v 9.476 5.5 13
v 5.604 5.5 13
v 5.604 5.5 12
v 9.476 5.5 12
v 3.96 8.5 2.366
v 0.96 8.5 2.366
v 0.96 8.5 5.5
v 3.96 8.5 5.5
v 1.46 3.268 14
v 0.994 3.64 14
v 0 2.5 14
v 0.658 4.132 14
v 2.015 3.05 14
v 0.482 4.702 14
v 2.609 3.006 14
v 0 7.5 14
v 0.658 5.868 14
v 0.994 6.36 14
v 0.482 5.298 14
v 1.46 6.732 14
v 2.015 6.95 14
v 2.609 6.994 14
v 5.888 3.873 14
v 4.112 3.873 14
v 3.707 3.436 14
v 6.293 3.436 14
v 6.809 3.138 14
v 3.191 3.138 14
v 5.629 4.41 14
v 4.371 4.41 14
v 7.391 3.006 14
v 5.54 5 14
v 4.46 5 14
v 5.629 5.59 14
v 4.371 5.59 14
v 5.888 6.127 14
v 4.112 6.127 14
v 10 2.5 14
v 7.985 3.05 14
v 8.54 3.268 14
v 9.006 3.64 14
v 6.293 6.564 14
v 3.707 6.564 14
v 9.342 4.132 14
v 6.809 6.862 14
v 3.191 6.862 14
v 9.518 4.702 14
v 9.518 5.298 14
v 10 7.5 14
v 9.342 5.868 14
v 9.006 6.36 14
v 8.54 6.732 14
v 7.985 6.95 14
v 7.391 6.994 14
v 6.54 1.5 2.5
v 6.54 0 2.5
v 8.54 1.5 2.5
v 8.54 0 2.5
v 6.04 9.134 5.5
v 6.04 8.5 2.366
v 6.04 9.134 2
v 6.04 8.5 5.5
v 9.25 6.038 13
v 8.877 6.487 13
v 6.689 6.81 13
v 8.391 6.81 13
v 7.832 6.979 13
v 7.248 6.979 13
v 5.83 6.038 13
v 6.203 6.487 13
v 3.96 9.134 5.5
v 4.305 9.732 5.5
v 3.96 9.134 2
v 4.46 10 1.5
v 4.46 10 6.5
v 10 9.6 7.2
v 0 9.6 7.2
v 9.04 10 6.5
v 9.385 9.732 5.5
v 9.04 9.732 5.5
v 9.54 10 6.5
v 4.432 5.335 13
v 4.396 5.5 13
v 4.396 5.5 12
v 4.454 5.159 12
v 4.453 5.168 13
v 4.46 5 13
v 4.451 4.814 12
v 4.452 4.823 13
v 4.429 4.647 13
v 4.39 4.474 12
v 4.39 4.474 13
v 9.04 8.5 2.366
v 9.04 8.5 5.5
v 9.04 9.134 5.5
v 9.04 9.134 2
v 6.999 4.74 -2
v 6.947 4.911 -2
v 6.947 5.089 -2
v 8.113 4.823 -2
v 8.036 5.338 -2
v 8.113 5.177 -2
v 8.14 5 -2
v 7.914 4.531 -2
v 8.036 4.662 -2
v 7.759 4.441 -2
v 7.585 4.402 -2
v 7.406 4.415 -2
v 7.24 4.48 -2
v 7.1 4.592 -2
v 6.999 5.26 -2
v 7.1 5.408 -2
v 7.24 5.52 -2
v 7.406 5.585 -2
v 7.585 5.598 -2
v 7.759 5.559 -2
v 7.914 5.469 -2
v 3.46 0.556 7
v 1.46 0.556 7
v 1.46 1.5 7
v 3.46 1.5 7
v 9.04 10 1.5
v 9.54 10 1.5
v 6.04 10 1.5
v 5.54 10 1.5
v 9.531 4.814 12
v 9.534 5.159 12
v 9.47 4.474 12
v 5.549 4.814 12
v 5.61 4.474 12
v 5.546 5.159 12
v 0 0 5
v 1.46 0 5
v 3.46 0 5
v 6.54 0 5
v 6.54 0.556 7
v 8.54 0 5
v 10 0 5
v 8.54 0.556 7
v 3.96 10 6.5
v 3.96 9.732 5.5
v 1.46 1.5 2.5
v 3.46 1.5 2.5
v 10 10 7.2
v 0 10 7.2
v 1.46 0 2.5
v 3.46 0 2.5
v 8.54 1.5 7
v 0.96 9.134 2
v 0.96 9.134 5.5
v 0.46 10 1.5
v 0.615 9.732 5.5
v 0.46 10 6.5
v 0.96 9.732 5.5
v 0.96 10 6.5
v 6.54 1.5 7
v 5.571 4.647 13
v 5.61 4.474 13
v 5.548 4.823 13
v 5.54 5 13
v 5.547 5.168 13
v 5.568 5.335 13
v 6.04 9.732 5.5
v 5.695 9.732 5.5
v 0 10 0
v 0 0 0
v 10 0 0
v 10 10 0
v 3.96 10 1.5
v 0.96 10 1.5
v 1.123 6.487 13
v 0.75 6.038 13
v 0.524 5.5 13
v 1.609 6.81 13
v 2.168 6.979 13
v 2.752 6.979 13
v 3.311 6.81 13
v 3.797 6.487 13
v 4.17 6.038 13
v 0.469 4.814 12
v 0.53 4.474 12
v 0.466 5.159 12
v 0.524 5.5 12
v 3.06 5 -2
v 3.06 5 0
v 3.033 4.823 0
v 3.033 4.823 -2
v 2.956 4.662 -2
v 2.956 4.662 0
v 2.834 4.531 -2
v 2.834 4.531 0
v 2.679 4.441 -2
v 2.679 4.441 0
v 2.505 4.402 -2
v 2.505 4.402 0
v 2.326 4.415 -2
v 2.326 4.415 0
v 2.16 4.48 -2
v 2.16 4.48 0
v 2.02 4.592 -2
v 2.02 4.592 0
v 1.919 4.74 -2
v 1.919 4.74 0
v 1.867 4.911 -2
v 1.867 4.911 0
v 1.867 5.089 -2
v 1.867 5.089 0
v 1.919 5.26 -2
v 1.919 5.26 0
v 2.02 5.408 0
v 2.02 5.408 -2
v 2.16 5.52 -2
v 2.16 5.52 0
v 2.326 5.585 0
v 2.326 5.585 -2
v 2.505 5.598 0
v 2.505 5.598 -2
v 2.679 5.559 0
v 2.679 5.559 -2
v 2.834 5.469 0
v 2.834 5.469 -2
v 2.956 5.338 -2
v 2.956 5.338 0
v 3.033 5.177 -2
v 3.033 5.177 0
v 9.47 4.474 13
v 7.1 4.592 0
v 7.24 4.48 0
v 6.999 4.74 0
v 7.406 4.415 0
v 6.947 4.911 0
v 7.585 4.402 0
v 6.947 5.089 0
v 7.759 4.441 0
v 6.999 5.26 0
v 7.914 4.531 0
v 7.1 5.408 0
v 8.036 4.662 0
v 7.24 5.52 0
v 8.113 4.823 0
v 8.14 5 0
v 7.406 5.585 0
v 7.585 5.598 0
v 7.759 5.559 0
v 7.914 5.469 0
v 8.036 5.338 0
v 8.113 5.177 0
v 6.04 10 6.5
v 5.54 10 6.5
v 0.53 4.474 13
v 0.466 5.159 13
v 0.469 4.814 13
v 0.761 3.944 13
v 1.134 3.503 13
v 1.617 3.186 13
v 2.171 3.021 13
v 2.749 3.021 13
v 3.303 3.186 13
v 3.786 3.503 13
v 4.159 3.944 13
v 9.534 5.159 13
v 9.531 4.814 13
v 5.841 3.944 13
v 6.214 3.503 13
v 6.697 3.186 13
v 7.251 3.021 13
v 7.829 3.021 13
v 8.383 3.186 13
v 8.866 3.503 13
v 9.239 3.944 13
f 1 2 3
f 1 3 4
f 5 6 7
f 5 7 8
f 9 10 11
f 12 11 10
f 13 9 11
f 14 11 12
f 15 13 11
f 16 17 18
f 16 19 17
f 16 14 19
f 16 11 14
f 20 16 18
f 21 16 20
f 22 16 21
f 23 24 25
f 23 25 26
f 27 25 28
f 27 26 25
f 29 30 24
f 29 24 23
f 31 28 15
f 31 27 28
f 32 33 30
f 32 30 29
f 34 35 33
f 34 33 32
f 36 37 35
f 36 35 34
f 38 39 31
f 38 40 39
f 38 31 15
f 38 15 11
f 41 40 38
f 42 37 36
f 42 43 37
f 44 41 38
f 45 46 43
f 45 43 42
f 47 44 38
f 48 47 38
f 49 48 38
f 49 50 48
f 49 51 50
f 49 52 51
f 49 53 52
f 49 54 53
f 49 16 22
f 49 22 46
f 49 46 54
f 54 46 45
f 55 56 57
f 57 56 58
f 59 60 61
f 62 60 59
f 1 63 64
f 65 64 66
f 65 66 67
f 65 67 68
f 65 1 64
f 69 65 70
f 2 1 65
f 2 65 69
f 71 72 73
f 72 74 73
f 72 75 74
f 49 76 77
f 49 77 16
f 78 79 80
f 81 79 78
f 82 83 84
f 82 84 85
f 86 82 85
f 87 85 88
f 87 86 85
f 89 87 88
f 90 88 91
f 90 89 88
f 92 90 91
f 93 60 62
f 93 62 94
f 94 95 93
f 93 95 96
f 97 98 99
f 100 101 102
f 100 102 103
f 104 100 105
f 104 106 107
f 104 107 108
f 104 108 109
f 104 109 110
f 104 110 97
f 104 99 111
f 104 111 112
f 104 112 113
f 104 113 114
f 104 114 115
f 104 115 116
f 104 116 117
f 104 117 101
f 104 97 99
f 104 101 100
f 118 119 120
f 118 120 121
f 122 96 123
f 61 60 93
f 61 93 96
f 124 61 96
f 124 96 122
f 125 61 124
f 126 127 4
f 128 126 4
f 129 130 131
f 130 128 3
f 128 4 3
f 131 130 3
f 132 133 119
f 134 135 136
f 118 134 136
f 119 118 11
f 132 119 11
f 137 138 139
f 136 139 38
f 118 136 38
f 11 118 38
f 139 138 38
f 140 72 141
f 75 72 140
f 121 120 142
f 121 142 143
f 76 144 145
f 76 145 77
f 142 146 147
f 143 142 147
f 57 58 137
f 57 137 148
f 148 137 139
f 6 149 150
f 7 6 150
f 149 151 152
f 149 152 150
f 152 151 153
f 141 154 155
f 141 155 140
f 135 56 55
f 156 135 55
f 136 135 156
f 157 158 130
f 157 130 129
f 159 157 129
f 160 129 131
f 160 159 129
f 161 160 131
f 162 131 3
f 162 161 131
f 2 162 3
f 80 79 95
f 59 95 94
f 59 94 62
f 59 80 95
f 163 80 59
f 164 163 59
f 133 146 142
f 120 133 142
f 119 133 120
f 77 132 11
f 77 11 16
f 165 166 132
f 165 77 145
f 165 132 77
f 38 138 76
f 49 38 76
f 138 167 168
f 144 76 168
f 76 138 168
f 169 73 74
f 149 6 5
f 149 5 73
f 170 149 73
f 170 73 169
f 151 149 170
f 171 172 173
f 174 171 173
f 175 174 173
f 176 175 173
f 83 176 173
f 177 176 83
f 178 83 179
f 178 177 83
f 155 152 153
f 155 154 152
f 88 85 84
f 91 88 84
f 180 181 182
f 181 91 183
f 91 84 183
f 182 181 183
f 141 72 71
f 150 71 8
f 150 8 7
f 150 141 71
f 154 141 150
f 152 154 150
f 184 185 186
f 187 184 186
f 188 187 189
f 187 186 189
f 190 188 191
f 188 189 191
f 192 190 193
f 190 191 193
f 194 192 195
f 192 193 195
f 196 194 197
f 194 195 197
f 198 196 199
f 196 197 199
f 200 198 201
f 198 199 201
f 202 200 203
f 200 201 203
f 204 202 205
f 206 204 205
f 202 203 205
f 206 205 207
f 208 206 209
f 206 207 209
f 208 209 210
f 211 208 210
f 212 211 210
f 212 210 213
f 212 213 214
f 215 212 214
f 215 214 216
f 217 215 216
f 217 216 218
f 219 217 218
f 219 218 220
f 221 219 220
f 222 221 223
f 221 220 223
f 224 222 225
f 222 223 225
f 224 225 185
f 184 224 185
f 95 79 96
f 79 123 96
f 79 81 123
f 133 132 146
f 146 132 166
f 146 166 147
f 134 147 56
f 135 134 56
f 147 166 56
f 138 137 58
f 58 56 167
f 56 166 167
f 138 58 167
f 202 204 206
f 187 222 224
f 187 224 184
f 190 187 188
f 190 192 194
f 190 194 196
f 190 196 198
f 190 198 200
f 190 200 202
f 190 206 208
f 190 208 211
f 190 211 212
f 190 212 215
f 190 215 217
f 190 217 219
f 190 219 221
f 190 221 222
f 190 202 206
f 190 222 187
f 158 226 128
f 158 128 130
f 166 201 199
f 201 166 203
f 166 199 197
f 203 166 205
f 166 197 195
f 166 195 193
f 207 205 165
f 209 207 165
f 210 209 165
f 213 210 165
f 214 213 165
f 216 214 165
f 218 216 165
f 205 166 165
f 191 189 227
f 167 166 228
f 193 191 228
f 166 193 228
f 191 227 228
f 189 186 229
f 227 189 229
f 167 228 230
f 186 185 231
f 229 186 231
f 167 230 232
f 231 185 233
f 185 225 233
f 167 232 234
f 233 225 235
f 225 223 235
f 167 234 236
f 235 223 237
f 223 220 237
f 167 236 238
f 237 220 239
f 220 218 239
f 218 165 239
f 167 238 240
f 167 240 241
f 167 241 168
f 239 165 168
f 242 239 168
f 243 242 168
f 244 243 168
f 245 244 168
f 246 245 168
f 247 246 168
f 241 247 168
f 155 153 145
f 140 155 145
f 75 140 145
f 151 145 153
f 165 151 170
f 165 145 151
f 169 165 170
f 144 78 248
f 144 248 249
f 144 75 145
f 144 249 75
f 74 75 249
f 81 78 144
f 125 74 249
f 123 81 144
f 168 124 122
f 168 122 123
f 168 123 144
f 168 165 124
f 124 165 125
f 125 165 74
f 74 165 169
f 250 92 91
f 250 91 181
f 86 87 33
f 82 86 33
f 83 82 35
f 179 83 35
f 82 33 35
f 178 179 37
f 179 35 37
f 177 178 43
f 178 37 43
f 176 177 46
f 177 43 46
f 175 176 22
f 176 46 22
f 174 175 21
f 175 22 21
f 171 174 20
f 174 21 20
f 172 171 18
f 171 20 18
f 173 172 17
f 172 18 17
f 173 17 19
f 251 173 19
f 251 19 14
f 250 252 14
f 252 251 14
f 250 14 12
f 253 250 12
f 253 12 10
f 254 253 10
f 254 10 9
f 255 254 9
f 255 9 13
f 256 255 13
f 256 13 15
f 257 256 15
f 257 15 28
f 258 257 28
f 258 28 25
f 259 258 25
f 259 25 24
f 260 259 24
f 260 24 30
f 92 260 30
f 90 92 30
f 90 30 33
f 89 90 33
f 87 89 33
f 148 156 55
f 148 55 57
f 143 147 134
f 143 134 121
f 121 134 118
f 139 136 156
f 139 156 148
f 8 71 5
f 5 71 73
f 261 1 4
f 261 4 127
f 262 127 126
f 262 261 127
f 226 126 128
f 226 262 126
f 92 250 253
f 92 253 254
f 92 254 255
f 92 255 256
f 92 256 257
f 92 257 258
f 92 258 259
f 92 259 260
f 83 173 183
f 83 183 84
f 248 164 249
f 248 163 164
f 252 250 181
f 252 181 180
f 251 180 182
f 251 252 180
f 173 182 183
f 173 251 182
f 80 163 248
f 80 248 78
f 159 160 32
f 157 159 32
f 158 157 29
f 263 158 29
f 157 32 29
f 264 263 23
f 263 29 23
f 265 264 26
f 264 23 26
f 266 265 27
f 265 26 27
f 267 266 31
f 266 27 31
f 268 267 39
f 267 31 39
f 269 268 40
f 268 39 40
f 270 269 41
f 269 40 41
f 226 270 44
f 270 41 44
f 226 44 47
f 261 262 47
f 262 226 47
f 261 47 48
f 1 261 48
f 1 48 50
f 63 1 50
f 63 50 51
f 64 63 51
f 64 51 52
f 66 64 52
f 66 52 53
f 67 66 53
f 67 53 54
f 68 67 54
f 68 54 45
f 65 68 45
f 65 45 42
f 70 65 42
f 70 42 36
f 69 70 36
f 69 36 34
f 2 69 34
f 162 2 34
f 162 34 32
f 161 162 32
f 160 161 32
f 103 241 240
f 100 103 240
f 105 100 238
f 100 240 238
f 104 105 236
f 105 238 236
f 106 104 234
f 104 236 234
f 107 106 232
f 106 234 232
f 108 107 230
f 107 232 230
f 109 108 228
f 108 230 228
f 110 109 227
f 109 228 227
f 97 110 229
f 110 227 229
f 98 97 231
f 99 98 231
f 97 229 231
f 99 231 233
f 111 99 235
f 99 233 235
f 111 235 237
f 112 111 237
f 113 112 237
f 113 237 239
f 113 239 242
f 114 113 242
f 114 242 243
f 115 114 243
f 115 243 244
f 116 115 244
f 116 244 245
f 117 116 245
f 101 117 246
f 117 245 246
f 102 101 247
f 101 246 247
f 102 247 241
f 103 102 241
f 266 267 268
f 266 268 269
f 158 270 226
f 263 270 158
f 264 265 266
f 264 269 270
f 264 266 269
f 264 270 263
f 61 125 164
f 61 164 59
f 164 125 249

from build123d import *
from build123d.topology import SkipClean

# Parameters (mm, degrees)
SKETCH_1_W          = 10
SKETCH_1_H          = 10
EXTRUDE_1_DEPTH     = 14
CUT_EXTRUDE_1_DEPTH = 20.899748742
SKETCH_3_W          = 3
SKETCH_3_H          = 3
CUT_EXTRUDE_2_DEPTH = 1.5
CHAMFER_1_SIZE      = 1
CHAMFER_1_SIZE2     = 0.267949192
CHAMFER_2_SIZE      = 1
CHAMFER_2_SIZE_2    = 1.732050808
CHAMFER_3_SIZE      = 0.5
CHAMFER_3_SIZE_2    = 0.866025404
SKETCH_4_W          = 2
SKETCH_4_H          = 4.5
CUT_EXTRUDE_3_DEPTH = 1.5
SKETCH_5_R          = 2
CUT_EXTRUDE_4_DEPTH = 1
CUT_EXTRUDE_5_DEPTH = 1
SKETCH_7_R          = 0.6
EXTRUDE_2_DEPTH     = 2


with BuildPart() as part:
    # 草图1 → 凸台-拉伸1 (new body)
    with BuildSketch(Plane.XY):
        with Locations((5, 5)):
            Rectangle(SKETCH_1_W, SKETCH_1_H)
    extrude(amount=EXTRUDE_1_DEPTH)

    # 草图2 → 切除-拉伸1 (cut, through all)
    with BuildSketch(Plane(origin=(10, 0, 0), x_dir=(0, 0, -1), z_dir=(1, 0, 0))):
        Polygon((-14, 2.5), (-14, 0), (-5, 0), align=None)
        Polygon((-14, 7.5), (-14, 10), (-7.2, 10), (-7.2, 9.6), align=None)
    extrude(amount=-CUT_EXTRUDE_1_DEPTH, mode=Mode.SUBTRACT)

    # 草图3 → 切除-拉伸2 (cut)
    with BuildSketch(Plane(origin=(0, 10, 0), x_dir=(1, 0, 0), z_dir=(0, 1, 0))):
        with Locations((2.46, -4)):
            Rectangle(SKETCH_3_W, SKETCH_3_H)
        with Locations((7.54, -4)):
            Rectangle(SKETCH_3_W, SKETCH_3_H)
    extrude(amount=-CUT_EXTRUDE_2_DEPTH, mode=Mode.SUBTRACT)

    # 倒角1
    chamfer_1_edges = [part.edges().sort_by_distance(p)[0] for p in [
        (2.46, 10, 5.5),
        (7.54, 10, 5.5),
    ]]
    chamfer_1_side = [part.faces().sort_by_distance(p)[0] for p in [
        (5, 10, 3.466666667),
    ]]
    chamfer(chamfer_1_edges, length=CHAMFER_1_SIZE, length2=CHAMFER_1_SIZE2, reference=chamfer_1_side[0])

    # 倒角2
    # the kernel refuses this chamfer: 1.732050808, 1 mm, written as the material it takes off along each edge
    with BuildSketch(Plane(origin=(0.96, 10, 2.5), x_dir=(0, 0.057893862402671484, -0.9983227437537926), z_dir=(1, 0, 0))) as chamfer_2_piece_1_section:
        Polygon((CHAMFER_2_SIZE * 0.998322743754, -CHAMFER_2_SIZE * 0.0578938624027), (-CHAMFER_2_SIZE_2 * 0.0578938623883, -CHAMFER_2_SIZE_2 * 0.998322743505), (0, 0), align=None)
    chamfer_2_piece_1 = extrude(amount=3, mode=Mode.PRIVATE)
    chamfer_2_piece_1 = split(chamfer_2_piece_1, bisect_by=Plane(origin=(2.46, 8.5, 2.161390478), z_dir=(0, 1, 0)), keep=Keep.TOP, mode=Mode.PRIVATE)
    add(chamfer_2_piece_1, mode=Mode.SUBTRACT)
    with BuildSketch(Plane(origin=(-3.520963971, 10, 2.5), x_dir=(0, 0.057893862402671484, -0.9983227437537926), z_dir=(1, 0, 0))) as chamfer_2_piece_2_section:
        Polygon((CHAMFER_2_SIZE * 0.998322743754, -CHAMFER_2_SIZE * 0.0578938624027), (-CHAMFER_2_SIZE_2 * 0.0578938623883, -CHAMFER_2_SIZE_2 * 0.998322743505), (0, 0), align=None)
    chamfer_2_piece_2 = extrude(amount=11.961927941, mode=Mode.PRIVATE)
    chamfer_2_piece_2 = split(chamfer_2_piece_2, bisect_by=Plane(origin=(7.240481985, 8.5, 2.161390478), z_dir=(0, 1, 0)), keep=Keep.TOP, mode=Mode.PRIVATE)
    chamfer_2_piece_2 = split(chamfer_2_piece_2, bisect_by=Plane(origin=(6.04, 9.440926985, 2.161390478), z_dir=(1, 0, 0)), keep=Keep.TOP, mode=Mode.PRIVATE)
    add(chamfer_2_piece_2, mode=Mode.SUBTRACT)
    with BuildSketch(Plane(origin=(1.559036029, 10, 2.5), x_dir=(0, 0.05789386240267147, -0.9983227437537926), z_dir=(1, 0, 0))) as chamfer_2_piece_3_section:
        Polygon((CHAMFER_2_SIZE * 0.998322743754, -CHAMFER_2_SIZE * 0.0578938624027), (-CHAMFER_2_SIZE_2 * 0.0578938623883, -CHAMFER_2_SIZE_2 * 0.998322743505), (0, 0), align=None)
    chamfer_2_piece_3 = extrude(amount=11.961927941, mode=Mode.PRIVATE)
    chamfer_2_piece_3 = split(chamfer_2_piece_3, bisect_by=Plane(origin=(2.759518015, 8.5, 2.161390478), z_dir=(0, 1, 0)), keep=Keep.TOP, mode=Mode.PRIVATE)
    chamfer_2_piece_3 = split(chamfer_2_piece_3, bisect_by=Plane(origin=(3.96, 9.440926985, 2.161390478), z_dir=(-1, 0, 0)), keep=Keep.TOP, mode=Mode.PRIVATE)
    add(chamfer_2_piece_3, mode=Mode.SUBTRACT)
    with BuildSketch(Plane(origin=(6.04, 10, 2.5), x_dir=(0, 0.057893862402671484, -0.9983227437537926), z_dir=(1, 0, 0))) as chamfer_2_piece_4_section:
        Polygon((CHAMFER_2_SIZE * 0.998322743754, -CHAMFER_2_SIZE * 0.0578938624027), (-CHAMFER_2_SIZE_2 * 0.0578938623883, -CHAMFER_2_SIZE_2 * 0.998322743505), (0, 0), align=None)
    chamfer_2_piece_4 = extrude(amount=3, mode=Mode.PRIVATE)
    chamfer_2_piece_4 = split(chamfer_2_piece_4, bisect_by=Plane(origin=(7.54, 8.5, 2.161390478), z_dir=(0, 1, 0)), keep=Keep.TOP, mode=Mode.PRIVATE)
    add(chamfer_2_piece_4, mode=Mode.SUBTRACT)

    # 倒角3
    # the kernel refuses this chamfer: 0.866025404, 0.5 mm, written as the material it takes off along each edge
    with BuildSketch(Plane(origin=(0.96, 10, 8.740481985), x_dir=(-0.9983227437537926, 0.057893862402669756, 3.38732848352391e-15), z_dir=(0, 0, -1))) as chamfer_3_piece_1_section:
        Polygon((CHAMFER_3_SIZE * 0.998322743754, -CHAMFER_3_SIZE * 0.0578938624027), (-CHAMFER_3_SIZE_2 * 0.0578938623883, -CHAMFER_3_SIZE_2 * 0.998322743505), (0, 0), align=None)
    chamfer_3_piece_1 = extrude(amount=9.480963971, mode=Mode.PRIVATE)
    chamfer_3_piece_1 = split(chamfer_3_piece_1, bisect_by=Plane(origin=(0.892667554, 9.405329997, 5.5), z_dir=(0, 0, -1)), keep=Keep.TOP, mode=Mode.PRIVATE)
    chamfer_3_piece_1 = split(chamfer_3_piece_1, bisect_by=Plane(origin=(0.892667554, 9.55774733, 4.849490567), z_dir=(0, -0.9659258262890682, 0.25881904510252124)), keep=Keep.TOP, mode=Mode.PRIVATE)
    add(chamfer_3_piece_1, mode=Mode.SUBTRACT)
    with BuildSketch(Plane(origin=(0.96, 10, 8.740481985), x_dir=(-0.9983227437537926, 0.057893862402669756, 3.38732848352391e-15), z_dir=(0, 0, -1))) as chamfer_3_piece_2_section:
        Polygon((CHAMFER_3_SIZE * 0.998322743754, -CHAMFER_3_SIZE * 0.0578938624027), (-CHAMFER_3_SIZE_2 * 0.0578938623883, -CHAMFER_3_SIZE_2 * 0.998322743505), (0, 0), align=None)
    chamfer_3_piece_2 = extrude(amount=9.480963971, mode=Mode.PRIVATE)
    chamfer_3_piece_2 = split(chamfer_3_piece_2, bisect_by=Plane(origin=(0.727363304, 9.931547557, 5.5), z_dir=(0, 0, 1)), keep=Keep.TOP, mode=Mode.PRIVATE)
    chamfer_3_piece_2 = split(chamfer_3_piece_2, bisect_by=Plane(origin=(0.727363304, 9.838481056, 5.897203096), z_dir=(0, 0.9659258262890682, -0.25881904510252124)), keep=Keep.TOP, mode=Mode.PRIVATE)
    add(chamfer_3_piece_2, mode=Mode.SUBTRACT)
    with BuildSketch(Plane(origin=(0.96, 10, 8.740481985), x_dir=(-0.9983227437537926, 0.057893862402669756, 3.38732848352391e-15), z_dir=(0, 0, -1))) as chamfer_3_piece_3_section:
        Polygon((CHAMFER_3_SIZE * 0.998322743754, -CHAMFER_3_SIZE * 0.0578938624027), (-CHAMFER_3_SIZE_2 * 0.0578938623883, -CHAMFER_3_SIZE_2 * 0.998322743505), (0, 0), align=None)
    chamfer_3_piece_3 = extrude(amount=9.480963971, mode=Mode.PRIVATE)
    chamfer_3_piece_3 = split(chamfer_3_piece_3, bisect_by=Plane(origin=(0.786656387, 9.751906355, 5.5), z_dir=(0, 0, -1)), keep=Keep.TOP, mode=Mode.PRIVATE)
    chamfer_3_piece_3 = split(chamfer_3_piece_3, bisect_by=Plane(origin=(0.786656387, 8.975998219, 2.091207704), z_dir=(0, 0.4999999999999566, 0.8660254037844637)), keep=Keep.TOP, mode=Mode.PRIVATE)
    chamfer_3_piece_3 = split(chamfer_3_piece_3, bisect_by=Plane(origin=(0.786656387, 9.217160881, 3.578404635), z_dir=(0, 0.9659258262890682, -0.25881904510252124)), keep=Keep.TOP, mode=Mode.PRIVATE)
    add(chamfer_3_piece_3, mode=Mode.SUBTRACT)
    with BuildSketch(Plane(origin=(3.96, 10, -0.740481985), x_dir=(0.9983227437537926, 0.057893862402669756, 3.38732848352391e-15), z_dir=(0, 0, 1))) as chamfer_3_piece_4_section:
        Polygon((CHAMFER_3_SIZE * 0.998322743754, -CHAMFER_3_SIZE * 0.0578938624027), (-CHAMFER_3_SIZE_2 * 0.0578938623883, -CHAMFER_3_SIZE_2 * 0.998322743505), (0, 0), align=None)
    chamfer_3_piece_4 = extrude(amount=9.480963971, mode=Mode.PRIVATE)
    chamfer_3_piece_4 = split(chamfer_3_piece_4, bisect_by=Plane(origin=(4.133343613, 9.751906355, 5.5), z_dir=(0, 0, -1)), keep=Keep.TOP, mode=Mode.PRIVATE)
    chamfer_3_piece_4 = split(chamfer_3_piece_4, bisect_by=Plane(origin=(4.133343613, 8.975998219, 2.091207704), z_dir=(0, 0.4999999999999566, 0.8660254037844637)), keep=Keep.TOP, mode=Mode.PRIVATE)
    chamfer_3_piece_4 = split(chamfer_3_piece_4, bisect_by=Plane(origin=(4.133343613, 9.217160881, 3.578404635), z_dir=(0, 0.9659258262890682, -0.25881904510252124)), keep=Keep.TOP, mode=Mode.PRIVATE)
    add(chamfer_3_piece_4, mode=Mode.SUBTRACT)
    with BuildSketch(Plane(origin=(3.96, 10, -0.740481985), x_dir=(0.9983227437537926, 0.057893862402669756, 3.38732848352391e-15), z_dir=(0, 0, 1))) as chamfer_3_piece_5_section:
        Polygon((CHAMFER_3_SIZE * 0.998322743754, -CHAMFER_3_SIZE * 0.0578938624027), (-CHAMFER_3_SIZE_2 * 0.0578938623883, -CHAMFER_3_SIZE_2 * 0.998322743505), (0, 0), align=None)
    chamfer_3_piece_5 = extrude(amount=9.480963971, mode=Mode.PRIVATE)
    chamfer_3_piece_5 = split(chamfer_3_piece_5, bisect_by=Plane(origin=(4.027332446, 9.405329997, 5.5), z_dir=(0, 0, -1)), keep=Keep.TOP, mode=Mode.PRIVATE)
    chamfer_3_piece_5 = split(chamfer_3_piece_5, bisect_by=Plane(origin=(4.027332446, 9.55774733, 4.849490567), z_dir=(0, -0.9659258262890682, 0.25881904510252124)), keep=Keep.TOP, mode=Mode.PRIVATE)
    add(chamfer_3_piece_5, mode=Mode.SUBTRACT)
    with BuildSketch(Plane(origin=(3.96, 10, -0.740481985), x_dir=(0.9983227437537926, 0.057893862402669756, 3.38732848352391e-15), z_dir=(0, 0, 1))) as chamfer_3_piece_6_section:
        Polygon((CHAMFER_3_SIZE * 0.998322743754, -CHAMFER_3_SIZE * 0.0578938624027), (-CHAMFER_3_SIZE_2 * 0.0578938623883, -CHAMFER_3_SIZE_2 * 0.998322743505), (0, 0), align=None)
    chamfer_3_piece_6 = extrude(amount=9.480963971, mode=Mode.PRIVATE)
    chamfer_3_piece_6 = split(chamfer_3_piece_6, bisect_by=Plane(origin=(4.192636696, 9.931547557, 5.5), z_dir=(0, 0, 1)), keep=Keep.TOP, mode=Mode.PRIVATE)
    chamfer_3_piece_6 = split(chamfer_3_piece_6, bisect_by=Plane(origin=(4.192636696, 9.838481056, 5.897203096), z_dir=(0, 0.9659258262890682, -0.25881904510252124)), keep=Keep.TOP, mode=Mode.PRIVATE)
    add(chamfer_3_piece_6, mode=Mode.SUBTRACT)
    with BuildSketch(Plane(origin=(6.04, 10, 8.740481985), x_dir=(-0.9983227437537926, 0.057893862402669756, 3.455429323526044e-15), z_dir=(0, 0, -1))) as chamfer_3_piece_7_section:
        Polygon((CHAMFER_3_SIZE * 0.998322743754, -CHAMFER_3_SIZE * 0.0578938624027), (-CHAMFER_3_SIZE_2 * 0.0578938623883, -CHAMFER_3_SIZE_2 * 0.998322743505), (0, 0), align=None)
    chamfer_3_piece_7 = extrude(amount=9.480963971, mode=Mode.PRIVATE)
    chamfer_3_piece_7 = split(chamfer_3_piece_7, bisect_by=Plane(origin=(5.972667554, 9.55774733, 4.849490567), z_dir=(0, -0.9659258262890682, 0.25881904510252124)), keep=Keep.TOP, mode=Mode.PRIVATE)
    chamfer_3_piece_7 = split(chamfer_3_piece_7, bisect_by=Plane(origin=(5.972667554, 9.405329997, 5.5), z_dir=(0, 0, -1)), keep=Keep.TOP, mode=Mode.PRIVATE)
    add(chamfer_3_piece_7, mode=Mode.SUBTRACT)
    with BuildSketch(Plane(origin=(6.04, 10, 8.740481985), x_dir=(-0.9983227437537926, 0.057893862402669756, 3.455429323526044e-15), z_dir=(0, 0, -1))) as chamfer_3_piece_8_section:
        Polygon((CHAMFER_3_SIZE * 0.998322743754, -CHAMFER_3_SIZE * 0.0578938624027), (-CHAMFER_3_SIZE_2 * 0.0578938623883, -CHAMFER_3_SIZE_2 * 0.998322743505), (0, 0), align=None)
    chamfer_3_piece_8 = extrude(amount=9.480963971, mode=Mode.PRIVATE)
    chamfer_3_piece_8 = split(chamfer_3_piece_8, bisect_by=Plane(origin=(5.807363304, 9.838481056, 5.897203096), z_dir=(0, 0.9659258262890682, -0.25881904510252124)), keep=Keep.TOP, mode=Mode.PRIVATE)
    chamfer_3_piece_8 = split(chamfer_3_piece_8, bisect_by=Plane(origin=(5.807363304, 9.931547557, 5.5), z_dir=(0, 0, 1)), keep=Keep.TOP, mode=Mode.PRIVATE)
    add(chamfer_3_piece_8, mode=Mode.SUBTRACT)
    with BuildSketch(Plane(origin=(6.04, 10, 8.740481985), x_dir=(-0.9983227437537926, 0.057893862402669756, 3.455429323526044e-15), z_dir=(0, 0, -1))) as chamfer_3_piece_9_section:
        Polygon((CHAMFER_3_SIZE * 0.998322743754, -CHAMFER_3_SIZE * 0.0578938624027), (-CHAMFER_3_SIZE_2 * 0.0578938623883, -CHAMFER_3_SIZE_2 * 0.998322743505), (0, 0), align=None)
    chamfer_3_piece_9 = extrude(amount=9.480963971, mode=Mode.PRIVATE)
    chamfer_3_piece_9 = split(chamfer_3_piece_9, bisect_by=Plane(origin=(5.866656387, 9.217160881, 3.578404635), z_dir=(0, 0.9659258262890682, -0.25881904510252124)), keep=Keep.TOP, mode=Mode.PRIVATE)
    chamfer_3_piece_9 = split(chamfer_3_piece_9, bisect_by=Plane(origin=(5.866656387, 9.751906355, 5.5), z_dir=(0, 0, -1)), keep=Keep.TOP, mode=Mode.PRIVATE)
    chamfer_3_piece_9 = split(chamfer_3_piece_9, bisect_by=Plane(origin=(5.866656387, 8.975998219, 2.091207704), z_dir=(0, 0.4999999999999566, 0.8660254037844637)), keep=Keep.TOP, mode=Mode.PRIVATE)
    add(chamfer_3_piece_9, mode=Mode.SUBTRACT)
    with BuildSketch(Plane(origin=(9.04, 10, -0.740481985), x_dir=(0.9983227437537927, 0.05789386240266987, 3.455429323526051e-15), z_dir=(0, 0, 1))) as chamfer_3_piece_10_section:
        Polygon((CHAMFER_3_SIZE * 0.998322743754, -CHAMFER_3_SIZE * 0.0578938624027), (-CHAMFER_3_SIZE_2 * 0.0578938623883, -CHAMFER_3_SIZE_2 * 0.998322743505), (0, 0), align=None)
    chamfer_3_piece_10 = extrude(amount=9.480963971, mode=Mode.PRIVATE)
    chamfer_3_piece_10 = split(chamfer_3_piece_10, bisect_by=Plane(origin=(9.213343613, 9.751906355, 5.5), z_dir=(0, 0, -1)), keep=Keep.TOP, mode=Mode.PRIVATE)
    chamfer_3_piece_10 = split(chamfer_3_piece_10, bisect_by=Plane(origin=(9.213343613, 8.975998219, 2.091207704), z_dir=(0, 0.4999999999999566, 0.8660254037844637)), keep=Keep.TOP, mode=Mode.PRIVATE)
    chamfer_3_piece_10 = split(chamfer_3_piece_10, bisect_by=Plane(origin=(9.213343613, 9.217160881, 3.578404635), z_dir=(0, 0.9659258262890682, -0.25881904510252124)), keep=Keep.TOP, mode=Mode.PRIVATE)
    add(chamfer_3_piece_10, mode=Mode.SUBTRACT)
    with BuildSketch(Plane(origin=(9.04, 10, -0.740481985), x_dir=(0.9983227437537927, 0.05789386240266987, 3.455429323526051e-15), z_dir=(0, 0, 1))) as chamfer_3_piece_11_section:
        Polygon((CHAMFER_3_SIZE * 0.998322743754, -CHAMFER_3_SIZE * 0.0578938624027), (-CHAMFER_3_SIZE_2 * 0.0578938623883, -CHAMFER_3_SIZE_2 * 0.998322743505), (0, 0), align=None)
    chamfer_3_piece_11 = extrude(amount=9.480963971, mode=Mode.PRIVATE)
    chamfer_3_piece_11 = split(chamfer_3_piece_11, bisect_by=Plane(origin=(9.107332446, 9.405329997, 5.5), z_dir=(0, 0, -1)), keep=Keep.TOP, mode=Mode.PRIVATE)
    chamfer_3_piece_11 = split(chamfer_3_piece_11, bisect_by=Plane(origin=(9.107332446, 9.55774733, 4.849490567), z_dir=(0, -0.9659258262890682, 0.25881904510252124)), keep=Keep.TOP, mode=Mode.PRIVATE)
    add(chamfer_3_piece_11, mode=Mode.SUBTRACT)
    with BuildSketch(Plane(origin=(9.04, 10, -0.740481985), x_dir=(0.9983227437537927, 0.05789386240266987, 3.455429323526051e-15), z_dir=(0, 0, 1))) as chamfer_3_piece_12_section:
        Polygon((CHAMFER_3_SIZE * 0.998322743754, -CHAMFER_3_SIZE * 0.0578938624027), (-CHAMFER_3_SIZE_2 * 0.0578938623883, -CHAMFER_3_SIZE_2 * 0.998322743505), (0, 0), align=None)
    chamfer_3_piece_12 = extrude(amount=9.480963971, mode=Mode.PRIVATE)
    chamfer_3_piece_12 = split(chamfer_3_piece_12, bisect_by=Plane(origin=(9.272636696, 9.931547557, 5.5), z_dir=(0, 0, 1)), keep=Keep.TOP, mode=Mode.PRIVATE)
    chamfer_3_piece_12 = split(chamfer_3_piece_12, bisect_by=Plane(origin=(9.272636696, 9.838481056, 5.897203096), z_dir=(0, 0.9659258262890682, -0.25881904510252124)), keep=Keep.TOP, mode=Mode.PRIVATE)
    add(chamfer_3_piece_12, mode=Mode.SUBTRACT)

    # 草图4 → 切除-拉伸3 (cut)
    with BuildSketch(Plane.XZ):
        with Locations((7.54, 4.75)):
            Rectangle(SKETCH_4_W, SKETCH_4_H)
        with Locations((2.46, 4.75)):
            Rectangle(SKETCH_4_W, SKETCH_4_H)
    extrude(amount=-CUT_EXTRUDE_3_DEPTH, mode=Mode.SUBTRACT)

    # 草图5 → 切除-拉伸4 (cut)
    with BuildSketch(Plane.XY.offset(14)):
        with Locations((2.46, 5)):
            Circle(SKETCH_5_R)
        with Locations(Location((7.54, 5, 0), (0, 0, 180))):
            Circle(SKETCH_5_R)
    extrude(amount=-CUT_EXTRUDE_4_DEPTH, mode=Mode.SUBTRACT)

    # 草图6 → 切除-拉伸5 (cut)
    with SkipClean():  # the faces are left unmerged after this step: merging them gives an invalid solid
        with BuildSketch(Plane.XY.offset(13)):
            with BuildLine():
                Line((0.523508327, 5.5), (4.396491673, 5.5))
                ThreePointArc((4.396491673, 5.5), (4.459953667, 4.986386343), (4.389505556, 4.473684211))
                Line((4.389505556, 4.473684211), (0.530494444, 4.473684211))
                ThreePointArc((0.530494444, 4.473684211), (0.460046333, 4.986386343), (0.523508327, 5.5))
            make_face()
            with BuildLine():
                Line((9.469505556, 4.473684211), (5.610494444, 4.473684211))
                ThreePointArc((5.610494444, 4.473684211), (5.540046333, 4.986386343), (5.603508327, 5.5))
                Line((5.603508327, 5.5), (9.476491673, 5.5))
                ThreePointArc((9.476491673, 5.5), (9.539953667, 4.986386343), (9.469505556, 4.473684211))
            make_face()
        extrude(amount=-CUT_EXTRUDE_5_DEPTH, mode=Mode.SUBTRACT)

    # 草图7 → 凸台-拉伸2 (add)
    with SkipClean():  # the faces are left unmerged after this step: merging them gives an invalid solid
        with BuildSketch(Plane(origin=(0, 0, 0), x_dir=(-1, 0, 0), z_dir=(0, 0, -1))):
            with Locations(Location((-7.54, 5, 0), (0, 0, 180))):
                Circle(SKETCH_7_R)
            with Locations(Location((-2.46, 5, 0), (0, 0, 180))):
                Circle(SKETCH_7_R)
        extrude(amount=EXTRUDE_2_DEPTH)


solid = part.part
